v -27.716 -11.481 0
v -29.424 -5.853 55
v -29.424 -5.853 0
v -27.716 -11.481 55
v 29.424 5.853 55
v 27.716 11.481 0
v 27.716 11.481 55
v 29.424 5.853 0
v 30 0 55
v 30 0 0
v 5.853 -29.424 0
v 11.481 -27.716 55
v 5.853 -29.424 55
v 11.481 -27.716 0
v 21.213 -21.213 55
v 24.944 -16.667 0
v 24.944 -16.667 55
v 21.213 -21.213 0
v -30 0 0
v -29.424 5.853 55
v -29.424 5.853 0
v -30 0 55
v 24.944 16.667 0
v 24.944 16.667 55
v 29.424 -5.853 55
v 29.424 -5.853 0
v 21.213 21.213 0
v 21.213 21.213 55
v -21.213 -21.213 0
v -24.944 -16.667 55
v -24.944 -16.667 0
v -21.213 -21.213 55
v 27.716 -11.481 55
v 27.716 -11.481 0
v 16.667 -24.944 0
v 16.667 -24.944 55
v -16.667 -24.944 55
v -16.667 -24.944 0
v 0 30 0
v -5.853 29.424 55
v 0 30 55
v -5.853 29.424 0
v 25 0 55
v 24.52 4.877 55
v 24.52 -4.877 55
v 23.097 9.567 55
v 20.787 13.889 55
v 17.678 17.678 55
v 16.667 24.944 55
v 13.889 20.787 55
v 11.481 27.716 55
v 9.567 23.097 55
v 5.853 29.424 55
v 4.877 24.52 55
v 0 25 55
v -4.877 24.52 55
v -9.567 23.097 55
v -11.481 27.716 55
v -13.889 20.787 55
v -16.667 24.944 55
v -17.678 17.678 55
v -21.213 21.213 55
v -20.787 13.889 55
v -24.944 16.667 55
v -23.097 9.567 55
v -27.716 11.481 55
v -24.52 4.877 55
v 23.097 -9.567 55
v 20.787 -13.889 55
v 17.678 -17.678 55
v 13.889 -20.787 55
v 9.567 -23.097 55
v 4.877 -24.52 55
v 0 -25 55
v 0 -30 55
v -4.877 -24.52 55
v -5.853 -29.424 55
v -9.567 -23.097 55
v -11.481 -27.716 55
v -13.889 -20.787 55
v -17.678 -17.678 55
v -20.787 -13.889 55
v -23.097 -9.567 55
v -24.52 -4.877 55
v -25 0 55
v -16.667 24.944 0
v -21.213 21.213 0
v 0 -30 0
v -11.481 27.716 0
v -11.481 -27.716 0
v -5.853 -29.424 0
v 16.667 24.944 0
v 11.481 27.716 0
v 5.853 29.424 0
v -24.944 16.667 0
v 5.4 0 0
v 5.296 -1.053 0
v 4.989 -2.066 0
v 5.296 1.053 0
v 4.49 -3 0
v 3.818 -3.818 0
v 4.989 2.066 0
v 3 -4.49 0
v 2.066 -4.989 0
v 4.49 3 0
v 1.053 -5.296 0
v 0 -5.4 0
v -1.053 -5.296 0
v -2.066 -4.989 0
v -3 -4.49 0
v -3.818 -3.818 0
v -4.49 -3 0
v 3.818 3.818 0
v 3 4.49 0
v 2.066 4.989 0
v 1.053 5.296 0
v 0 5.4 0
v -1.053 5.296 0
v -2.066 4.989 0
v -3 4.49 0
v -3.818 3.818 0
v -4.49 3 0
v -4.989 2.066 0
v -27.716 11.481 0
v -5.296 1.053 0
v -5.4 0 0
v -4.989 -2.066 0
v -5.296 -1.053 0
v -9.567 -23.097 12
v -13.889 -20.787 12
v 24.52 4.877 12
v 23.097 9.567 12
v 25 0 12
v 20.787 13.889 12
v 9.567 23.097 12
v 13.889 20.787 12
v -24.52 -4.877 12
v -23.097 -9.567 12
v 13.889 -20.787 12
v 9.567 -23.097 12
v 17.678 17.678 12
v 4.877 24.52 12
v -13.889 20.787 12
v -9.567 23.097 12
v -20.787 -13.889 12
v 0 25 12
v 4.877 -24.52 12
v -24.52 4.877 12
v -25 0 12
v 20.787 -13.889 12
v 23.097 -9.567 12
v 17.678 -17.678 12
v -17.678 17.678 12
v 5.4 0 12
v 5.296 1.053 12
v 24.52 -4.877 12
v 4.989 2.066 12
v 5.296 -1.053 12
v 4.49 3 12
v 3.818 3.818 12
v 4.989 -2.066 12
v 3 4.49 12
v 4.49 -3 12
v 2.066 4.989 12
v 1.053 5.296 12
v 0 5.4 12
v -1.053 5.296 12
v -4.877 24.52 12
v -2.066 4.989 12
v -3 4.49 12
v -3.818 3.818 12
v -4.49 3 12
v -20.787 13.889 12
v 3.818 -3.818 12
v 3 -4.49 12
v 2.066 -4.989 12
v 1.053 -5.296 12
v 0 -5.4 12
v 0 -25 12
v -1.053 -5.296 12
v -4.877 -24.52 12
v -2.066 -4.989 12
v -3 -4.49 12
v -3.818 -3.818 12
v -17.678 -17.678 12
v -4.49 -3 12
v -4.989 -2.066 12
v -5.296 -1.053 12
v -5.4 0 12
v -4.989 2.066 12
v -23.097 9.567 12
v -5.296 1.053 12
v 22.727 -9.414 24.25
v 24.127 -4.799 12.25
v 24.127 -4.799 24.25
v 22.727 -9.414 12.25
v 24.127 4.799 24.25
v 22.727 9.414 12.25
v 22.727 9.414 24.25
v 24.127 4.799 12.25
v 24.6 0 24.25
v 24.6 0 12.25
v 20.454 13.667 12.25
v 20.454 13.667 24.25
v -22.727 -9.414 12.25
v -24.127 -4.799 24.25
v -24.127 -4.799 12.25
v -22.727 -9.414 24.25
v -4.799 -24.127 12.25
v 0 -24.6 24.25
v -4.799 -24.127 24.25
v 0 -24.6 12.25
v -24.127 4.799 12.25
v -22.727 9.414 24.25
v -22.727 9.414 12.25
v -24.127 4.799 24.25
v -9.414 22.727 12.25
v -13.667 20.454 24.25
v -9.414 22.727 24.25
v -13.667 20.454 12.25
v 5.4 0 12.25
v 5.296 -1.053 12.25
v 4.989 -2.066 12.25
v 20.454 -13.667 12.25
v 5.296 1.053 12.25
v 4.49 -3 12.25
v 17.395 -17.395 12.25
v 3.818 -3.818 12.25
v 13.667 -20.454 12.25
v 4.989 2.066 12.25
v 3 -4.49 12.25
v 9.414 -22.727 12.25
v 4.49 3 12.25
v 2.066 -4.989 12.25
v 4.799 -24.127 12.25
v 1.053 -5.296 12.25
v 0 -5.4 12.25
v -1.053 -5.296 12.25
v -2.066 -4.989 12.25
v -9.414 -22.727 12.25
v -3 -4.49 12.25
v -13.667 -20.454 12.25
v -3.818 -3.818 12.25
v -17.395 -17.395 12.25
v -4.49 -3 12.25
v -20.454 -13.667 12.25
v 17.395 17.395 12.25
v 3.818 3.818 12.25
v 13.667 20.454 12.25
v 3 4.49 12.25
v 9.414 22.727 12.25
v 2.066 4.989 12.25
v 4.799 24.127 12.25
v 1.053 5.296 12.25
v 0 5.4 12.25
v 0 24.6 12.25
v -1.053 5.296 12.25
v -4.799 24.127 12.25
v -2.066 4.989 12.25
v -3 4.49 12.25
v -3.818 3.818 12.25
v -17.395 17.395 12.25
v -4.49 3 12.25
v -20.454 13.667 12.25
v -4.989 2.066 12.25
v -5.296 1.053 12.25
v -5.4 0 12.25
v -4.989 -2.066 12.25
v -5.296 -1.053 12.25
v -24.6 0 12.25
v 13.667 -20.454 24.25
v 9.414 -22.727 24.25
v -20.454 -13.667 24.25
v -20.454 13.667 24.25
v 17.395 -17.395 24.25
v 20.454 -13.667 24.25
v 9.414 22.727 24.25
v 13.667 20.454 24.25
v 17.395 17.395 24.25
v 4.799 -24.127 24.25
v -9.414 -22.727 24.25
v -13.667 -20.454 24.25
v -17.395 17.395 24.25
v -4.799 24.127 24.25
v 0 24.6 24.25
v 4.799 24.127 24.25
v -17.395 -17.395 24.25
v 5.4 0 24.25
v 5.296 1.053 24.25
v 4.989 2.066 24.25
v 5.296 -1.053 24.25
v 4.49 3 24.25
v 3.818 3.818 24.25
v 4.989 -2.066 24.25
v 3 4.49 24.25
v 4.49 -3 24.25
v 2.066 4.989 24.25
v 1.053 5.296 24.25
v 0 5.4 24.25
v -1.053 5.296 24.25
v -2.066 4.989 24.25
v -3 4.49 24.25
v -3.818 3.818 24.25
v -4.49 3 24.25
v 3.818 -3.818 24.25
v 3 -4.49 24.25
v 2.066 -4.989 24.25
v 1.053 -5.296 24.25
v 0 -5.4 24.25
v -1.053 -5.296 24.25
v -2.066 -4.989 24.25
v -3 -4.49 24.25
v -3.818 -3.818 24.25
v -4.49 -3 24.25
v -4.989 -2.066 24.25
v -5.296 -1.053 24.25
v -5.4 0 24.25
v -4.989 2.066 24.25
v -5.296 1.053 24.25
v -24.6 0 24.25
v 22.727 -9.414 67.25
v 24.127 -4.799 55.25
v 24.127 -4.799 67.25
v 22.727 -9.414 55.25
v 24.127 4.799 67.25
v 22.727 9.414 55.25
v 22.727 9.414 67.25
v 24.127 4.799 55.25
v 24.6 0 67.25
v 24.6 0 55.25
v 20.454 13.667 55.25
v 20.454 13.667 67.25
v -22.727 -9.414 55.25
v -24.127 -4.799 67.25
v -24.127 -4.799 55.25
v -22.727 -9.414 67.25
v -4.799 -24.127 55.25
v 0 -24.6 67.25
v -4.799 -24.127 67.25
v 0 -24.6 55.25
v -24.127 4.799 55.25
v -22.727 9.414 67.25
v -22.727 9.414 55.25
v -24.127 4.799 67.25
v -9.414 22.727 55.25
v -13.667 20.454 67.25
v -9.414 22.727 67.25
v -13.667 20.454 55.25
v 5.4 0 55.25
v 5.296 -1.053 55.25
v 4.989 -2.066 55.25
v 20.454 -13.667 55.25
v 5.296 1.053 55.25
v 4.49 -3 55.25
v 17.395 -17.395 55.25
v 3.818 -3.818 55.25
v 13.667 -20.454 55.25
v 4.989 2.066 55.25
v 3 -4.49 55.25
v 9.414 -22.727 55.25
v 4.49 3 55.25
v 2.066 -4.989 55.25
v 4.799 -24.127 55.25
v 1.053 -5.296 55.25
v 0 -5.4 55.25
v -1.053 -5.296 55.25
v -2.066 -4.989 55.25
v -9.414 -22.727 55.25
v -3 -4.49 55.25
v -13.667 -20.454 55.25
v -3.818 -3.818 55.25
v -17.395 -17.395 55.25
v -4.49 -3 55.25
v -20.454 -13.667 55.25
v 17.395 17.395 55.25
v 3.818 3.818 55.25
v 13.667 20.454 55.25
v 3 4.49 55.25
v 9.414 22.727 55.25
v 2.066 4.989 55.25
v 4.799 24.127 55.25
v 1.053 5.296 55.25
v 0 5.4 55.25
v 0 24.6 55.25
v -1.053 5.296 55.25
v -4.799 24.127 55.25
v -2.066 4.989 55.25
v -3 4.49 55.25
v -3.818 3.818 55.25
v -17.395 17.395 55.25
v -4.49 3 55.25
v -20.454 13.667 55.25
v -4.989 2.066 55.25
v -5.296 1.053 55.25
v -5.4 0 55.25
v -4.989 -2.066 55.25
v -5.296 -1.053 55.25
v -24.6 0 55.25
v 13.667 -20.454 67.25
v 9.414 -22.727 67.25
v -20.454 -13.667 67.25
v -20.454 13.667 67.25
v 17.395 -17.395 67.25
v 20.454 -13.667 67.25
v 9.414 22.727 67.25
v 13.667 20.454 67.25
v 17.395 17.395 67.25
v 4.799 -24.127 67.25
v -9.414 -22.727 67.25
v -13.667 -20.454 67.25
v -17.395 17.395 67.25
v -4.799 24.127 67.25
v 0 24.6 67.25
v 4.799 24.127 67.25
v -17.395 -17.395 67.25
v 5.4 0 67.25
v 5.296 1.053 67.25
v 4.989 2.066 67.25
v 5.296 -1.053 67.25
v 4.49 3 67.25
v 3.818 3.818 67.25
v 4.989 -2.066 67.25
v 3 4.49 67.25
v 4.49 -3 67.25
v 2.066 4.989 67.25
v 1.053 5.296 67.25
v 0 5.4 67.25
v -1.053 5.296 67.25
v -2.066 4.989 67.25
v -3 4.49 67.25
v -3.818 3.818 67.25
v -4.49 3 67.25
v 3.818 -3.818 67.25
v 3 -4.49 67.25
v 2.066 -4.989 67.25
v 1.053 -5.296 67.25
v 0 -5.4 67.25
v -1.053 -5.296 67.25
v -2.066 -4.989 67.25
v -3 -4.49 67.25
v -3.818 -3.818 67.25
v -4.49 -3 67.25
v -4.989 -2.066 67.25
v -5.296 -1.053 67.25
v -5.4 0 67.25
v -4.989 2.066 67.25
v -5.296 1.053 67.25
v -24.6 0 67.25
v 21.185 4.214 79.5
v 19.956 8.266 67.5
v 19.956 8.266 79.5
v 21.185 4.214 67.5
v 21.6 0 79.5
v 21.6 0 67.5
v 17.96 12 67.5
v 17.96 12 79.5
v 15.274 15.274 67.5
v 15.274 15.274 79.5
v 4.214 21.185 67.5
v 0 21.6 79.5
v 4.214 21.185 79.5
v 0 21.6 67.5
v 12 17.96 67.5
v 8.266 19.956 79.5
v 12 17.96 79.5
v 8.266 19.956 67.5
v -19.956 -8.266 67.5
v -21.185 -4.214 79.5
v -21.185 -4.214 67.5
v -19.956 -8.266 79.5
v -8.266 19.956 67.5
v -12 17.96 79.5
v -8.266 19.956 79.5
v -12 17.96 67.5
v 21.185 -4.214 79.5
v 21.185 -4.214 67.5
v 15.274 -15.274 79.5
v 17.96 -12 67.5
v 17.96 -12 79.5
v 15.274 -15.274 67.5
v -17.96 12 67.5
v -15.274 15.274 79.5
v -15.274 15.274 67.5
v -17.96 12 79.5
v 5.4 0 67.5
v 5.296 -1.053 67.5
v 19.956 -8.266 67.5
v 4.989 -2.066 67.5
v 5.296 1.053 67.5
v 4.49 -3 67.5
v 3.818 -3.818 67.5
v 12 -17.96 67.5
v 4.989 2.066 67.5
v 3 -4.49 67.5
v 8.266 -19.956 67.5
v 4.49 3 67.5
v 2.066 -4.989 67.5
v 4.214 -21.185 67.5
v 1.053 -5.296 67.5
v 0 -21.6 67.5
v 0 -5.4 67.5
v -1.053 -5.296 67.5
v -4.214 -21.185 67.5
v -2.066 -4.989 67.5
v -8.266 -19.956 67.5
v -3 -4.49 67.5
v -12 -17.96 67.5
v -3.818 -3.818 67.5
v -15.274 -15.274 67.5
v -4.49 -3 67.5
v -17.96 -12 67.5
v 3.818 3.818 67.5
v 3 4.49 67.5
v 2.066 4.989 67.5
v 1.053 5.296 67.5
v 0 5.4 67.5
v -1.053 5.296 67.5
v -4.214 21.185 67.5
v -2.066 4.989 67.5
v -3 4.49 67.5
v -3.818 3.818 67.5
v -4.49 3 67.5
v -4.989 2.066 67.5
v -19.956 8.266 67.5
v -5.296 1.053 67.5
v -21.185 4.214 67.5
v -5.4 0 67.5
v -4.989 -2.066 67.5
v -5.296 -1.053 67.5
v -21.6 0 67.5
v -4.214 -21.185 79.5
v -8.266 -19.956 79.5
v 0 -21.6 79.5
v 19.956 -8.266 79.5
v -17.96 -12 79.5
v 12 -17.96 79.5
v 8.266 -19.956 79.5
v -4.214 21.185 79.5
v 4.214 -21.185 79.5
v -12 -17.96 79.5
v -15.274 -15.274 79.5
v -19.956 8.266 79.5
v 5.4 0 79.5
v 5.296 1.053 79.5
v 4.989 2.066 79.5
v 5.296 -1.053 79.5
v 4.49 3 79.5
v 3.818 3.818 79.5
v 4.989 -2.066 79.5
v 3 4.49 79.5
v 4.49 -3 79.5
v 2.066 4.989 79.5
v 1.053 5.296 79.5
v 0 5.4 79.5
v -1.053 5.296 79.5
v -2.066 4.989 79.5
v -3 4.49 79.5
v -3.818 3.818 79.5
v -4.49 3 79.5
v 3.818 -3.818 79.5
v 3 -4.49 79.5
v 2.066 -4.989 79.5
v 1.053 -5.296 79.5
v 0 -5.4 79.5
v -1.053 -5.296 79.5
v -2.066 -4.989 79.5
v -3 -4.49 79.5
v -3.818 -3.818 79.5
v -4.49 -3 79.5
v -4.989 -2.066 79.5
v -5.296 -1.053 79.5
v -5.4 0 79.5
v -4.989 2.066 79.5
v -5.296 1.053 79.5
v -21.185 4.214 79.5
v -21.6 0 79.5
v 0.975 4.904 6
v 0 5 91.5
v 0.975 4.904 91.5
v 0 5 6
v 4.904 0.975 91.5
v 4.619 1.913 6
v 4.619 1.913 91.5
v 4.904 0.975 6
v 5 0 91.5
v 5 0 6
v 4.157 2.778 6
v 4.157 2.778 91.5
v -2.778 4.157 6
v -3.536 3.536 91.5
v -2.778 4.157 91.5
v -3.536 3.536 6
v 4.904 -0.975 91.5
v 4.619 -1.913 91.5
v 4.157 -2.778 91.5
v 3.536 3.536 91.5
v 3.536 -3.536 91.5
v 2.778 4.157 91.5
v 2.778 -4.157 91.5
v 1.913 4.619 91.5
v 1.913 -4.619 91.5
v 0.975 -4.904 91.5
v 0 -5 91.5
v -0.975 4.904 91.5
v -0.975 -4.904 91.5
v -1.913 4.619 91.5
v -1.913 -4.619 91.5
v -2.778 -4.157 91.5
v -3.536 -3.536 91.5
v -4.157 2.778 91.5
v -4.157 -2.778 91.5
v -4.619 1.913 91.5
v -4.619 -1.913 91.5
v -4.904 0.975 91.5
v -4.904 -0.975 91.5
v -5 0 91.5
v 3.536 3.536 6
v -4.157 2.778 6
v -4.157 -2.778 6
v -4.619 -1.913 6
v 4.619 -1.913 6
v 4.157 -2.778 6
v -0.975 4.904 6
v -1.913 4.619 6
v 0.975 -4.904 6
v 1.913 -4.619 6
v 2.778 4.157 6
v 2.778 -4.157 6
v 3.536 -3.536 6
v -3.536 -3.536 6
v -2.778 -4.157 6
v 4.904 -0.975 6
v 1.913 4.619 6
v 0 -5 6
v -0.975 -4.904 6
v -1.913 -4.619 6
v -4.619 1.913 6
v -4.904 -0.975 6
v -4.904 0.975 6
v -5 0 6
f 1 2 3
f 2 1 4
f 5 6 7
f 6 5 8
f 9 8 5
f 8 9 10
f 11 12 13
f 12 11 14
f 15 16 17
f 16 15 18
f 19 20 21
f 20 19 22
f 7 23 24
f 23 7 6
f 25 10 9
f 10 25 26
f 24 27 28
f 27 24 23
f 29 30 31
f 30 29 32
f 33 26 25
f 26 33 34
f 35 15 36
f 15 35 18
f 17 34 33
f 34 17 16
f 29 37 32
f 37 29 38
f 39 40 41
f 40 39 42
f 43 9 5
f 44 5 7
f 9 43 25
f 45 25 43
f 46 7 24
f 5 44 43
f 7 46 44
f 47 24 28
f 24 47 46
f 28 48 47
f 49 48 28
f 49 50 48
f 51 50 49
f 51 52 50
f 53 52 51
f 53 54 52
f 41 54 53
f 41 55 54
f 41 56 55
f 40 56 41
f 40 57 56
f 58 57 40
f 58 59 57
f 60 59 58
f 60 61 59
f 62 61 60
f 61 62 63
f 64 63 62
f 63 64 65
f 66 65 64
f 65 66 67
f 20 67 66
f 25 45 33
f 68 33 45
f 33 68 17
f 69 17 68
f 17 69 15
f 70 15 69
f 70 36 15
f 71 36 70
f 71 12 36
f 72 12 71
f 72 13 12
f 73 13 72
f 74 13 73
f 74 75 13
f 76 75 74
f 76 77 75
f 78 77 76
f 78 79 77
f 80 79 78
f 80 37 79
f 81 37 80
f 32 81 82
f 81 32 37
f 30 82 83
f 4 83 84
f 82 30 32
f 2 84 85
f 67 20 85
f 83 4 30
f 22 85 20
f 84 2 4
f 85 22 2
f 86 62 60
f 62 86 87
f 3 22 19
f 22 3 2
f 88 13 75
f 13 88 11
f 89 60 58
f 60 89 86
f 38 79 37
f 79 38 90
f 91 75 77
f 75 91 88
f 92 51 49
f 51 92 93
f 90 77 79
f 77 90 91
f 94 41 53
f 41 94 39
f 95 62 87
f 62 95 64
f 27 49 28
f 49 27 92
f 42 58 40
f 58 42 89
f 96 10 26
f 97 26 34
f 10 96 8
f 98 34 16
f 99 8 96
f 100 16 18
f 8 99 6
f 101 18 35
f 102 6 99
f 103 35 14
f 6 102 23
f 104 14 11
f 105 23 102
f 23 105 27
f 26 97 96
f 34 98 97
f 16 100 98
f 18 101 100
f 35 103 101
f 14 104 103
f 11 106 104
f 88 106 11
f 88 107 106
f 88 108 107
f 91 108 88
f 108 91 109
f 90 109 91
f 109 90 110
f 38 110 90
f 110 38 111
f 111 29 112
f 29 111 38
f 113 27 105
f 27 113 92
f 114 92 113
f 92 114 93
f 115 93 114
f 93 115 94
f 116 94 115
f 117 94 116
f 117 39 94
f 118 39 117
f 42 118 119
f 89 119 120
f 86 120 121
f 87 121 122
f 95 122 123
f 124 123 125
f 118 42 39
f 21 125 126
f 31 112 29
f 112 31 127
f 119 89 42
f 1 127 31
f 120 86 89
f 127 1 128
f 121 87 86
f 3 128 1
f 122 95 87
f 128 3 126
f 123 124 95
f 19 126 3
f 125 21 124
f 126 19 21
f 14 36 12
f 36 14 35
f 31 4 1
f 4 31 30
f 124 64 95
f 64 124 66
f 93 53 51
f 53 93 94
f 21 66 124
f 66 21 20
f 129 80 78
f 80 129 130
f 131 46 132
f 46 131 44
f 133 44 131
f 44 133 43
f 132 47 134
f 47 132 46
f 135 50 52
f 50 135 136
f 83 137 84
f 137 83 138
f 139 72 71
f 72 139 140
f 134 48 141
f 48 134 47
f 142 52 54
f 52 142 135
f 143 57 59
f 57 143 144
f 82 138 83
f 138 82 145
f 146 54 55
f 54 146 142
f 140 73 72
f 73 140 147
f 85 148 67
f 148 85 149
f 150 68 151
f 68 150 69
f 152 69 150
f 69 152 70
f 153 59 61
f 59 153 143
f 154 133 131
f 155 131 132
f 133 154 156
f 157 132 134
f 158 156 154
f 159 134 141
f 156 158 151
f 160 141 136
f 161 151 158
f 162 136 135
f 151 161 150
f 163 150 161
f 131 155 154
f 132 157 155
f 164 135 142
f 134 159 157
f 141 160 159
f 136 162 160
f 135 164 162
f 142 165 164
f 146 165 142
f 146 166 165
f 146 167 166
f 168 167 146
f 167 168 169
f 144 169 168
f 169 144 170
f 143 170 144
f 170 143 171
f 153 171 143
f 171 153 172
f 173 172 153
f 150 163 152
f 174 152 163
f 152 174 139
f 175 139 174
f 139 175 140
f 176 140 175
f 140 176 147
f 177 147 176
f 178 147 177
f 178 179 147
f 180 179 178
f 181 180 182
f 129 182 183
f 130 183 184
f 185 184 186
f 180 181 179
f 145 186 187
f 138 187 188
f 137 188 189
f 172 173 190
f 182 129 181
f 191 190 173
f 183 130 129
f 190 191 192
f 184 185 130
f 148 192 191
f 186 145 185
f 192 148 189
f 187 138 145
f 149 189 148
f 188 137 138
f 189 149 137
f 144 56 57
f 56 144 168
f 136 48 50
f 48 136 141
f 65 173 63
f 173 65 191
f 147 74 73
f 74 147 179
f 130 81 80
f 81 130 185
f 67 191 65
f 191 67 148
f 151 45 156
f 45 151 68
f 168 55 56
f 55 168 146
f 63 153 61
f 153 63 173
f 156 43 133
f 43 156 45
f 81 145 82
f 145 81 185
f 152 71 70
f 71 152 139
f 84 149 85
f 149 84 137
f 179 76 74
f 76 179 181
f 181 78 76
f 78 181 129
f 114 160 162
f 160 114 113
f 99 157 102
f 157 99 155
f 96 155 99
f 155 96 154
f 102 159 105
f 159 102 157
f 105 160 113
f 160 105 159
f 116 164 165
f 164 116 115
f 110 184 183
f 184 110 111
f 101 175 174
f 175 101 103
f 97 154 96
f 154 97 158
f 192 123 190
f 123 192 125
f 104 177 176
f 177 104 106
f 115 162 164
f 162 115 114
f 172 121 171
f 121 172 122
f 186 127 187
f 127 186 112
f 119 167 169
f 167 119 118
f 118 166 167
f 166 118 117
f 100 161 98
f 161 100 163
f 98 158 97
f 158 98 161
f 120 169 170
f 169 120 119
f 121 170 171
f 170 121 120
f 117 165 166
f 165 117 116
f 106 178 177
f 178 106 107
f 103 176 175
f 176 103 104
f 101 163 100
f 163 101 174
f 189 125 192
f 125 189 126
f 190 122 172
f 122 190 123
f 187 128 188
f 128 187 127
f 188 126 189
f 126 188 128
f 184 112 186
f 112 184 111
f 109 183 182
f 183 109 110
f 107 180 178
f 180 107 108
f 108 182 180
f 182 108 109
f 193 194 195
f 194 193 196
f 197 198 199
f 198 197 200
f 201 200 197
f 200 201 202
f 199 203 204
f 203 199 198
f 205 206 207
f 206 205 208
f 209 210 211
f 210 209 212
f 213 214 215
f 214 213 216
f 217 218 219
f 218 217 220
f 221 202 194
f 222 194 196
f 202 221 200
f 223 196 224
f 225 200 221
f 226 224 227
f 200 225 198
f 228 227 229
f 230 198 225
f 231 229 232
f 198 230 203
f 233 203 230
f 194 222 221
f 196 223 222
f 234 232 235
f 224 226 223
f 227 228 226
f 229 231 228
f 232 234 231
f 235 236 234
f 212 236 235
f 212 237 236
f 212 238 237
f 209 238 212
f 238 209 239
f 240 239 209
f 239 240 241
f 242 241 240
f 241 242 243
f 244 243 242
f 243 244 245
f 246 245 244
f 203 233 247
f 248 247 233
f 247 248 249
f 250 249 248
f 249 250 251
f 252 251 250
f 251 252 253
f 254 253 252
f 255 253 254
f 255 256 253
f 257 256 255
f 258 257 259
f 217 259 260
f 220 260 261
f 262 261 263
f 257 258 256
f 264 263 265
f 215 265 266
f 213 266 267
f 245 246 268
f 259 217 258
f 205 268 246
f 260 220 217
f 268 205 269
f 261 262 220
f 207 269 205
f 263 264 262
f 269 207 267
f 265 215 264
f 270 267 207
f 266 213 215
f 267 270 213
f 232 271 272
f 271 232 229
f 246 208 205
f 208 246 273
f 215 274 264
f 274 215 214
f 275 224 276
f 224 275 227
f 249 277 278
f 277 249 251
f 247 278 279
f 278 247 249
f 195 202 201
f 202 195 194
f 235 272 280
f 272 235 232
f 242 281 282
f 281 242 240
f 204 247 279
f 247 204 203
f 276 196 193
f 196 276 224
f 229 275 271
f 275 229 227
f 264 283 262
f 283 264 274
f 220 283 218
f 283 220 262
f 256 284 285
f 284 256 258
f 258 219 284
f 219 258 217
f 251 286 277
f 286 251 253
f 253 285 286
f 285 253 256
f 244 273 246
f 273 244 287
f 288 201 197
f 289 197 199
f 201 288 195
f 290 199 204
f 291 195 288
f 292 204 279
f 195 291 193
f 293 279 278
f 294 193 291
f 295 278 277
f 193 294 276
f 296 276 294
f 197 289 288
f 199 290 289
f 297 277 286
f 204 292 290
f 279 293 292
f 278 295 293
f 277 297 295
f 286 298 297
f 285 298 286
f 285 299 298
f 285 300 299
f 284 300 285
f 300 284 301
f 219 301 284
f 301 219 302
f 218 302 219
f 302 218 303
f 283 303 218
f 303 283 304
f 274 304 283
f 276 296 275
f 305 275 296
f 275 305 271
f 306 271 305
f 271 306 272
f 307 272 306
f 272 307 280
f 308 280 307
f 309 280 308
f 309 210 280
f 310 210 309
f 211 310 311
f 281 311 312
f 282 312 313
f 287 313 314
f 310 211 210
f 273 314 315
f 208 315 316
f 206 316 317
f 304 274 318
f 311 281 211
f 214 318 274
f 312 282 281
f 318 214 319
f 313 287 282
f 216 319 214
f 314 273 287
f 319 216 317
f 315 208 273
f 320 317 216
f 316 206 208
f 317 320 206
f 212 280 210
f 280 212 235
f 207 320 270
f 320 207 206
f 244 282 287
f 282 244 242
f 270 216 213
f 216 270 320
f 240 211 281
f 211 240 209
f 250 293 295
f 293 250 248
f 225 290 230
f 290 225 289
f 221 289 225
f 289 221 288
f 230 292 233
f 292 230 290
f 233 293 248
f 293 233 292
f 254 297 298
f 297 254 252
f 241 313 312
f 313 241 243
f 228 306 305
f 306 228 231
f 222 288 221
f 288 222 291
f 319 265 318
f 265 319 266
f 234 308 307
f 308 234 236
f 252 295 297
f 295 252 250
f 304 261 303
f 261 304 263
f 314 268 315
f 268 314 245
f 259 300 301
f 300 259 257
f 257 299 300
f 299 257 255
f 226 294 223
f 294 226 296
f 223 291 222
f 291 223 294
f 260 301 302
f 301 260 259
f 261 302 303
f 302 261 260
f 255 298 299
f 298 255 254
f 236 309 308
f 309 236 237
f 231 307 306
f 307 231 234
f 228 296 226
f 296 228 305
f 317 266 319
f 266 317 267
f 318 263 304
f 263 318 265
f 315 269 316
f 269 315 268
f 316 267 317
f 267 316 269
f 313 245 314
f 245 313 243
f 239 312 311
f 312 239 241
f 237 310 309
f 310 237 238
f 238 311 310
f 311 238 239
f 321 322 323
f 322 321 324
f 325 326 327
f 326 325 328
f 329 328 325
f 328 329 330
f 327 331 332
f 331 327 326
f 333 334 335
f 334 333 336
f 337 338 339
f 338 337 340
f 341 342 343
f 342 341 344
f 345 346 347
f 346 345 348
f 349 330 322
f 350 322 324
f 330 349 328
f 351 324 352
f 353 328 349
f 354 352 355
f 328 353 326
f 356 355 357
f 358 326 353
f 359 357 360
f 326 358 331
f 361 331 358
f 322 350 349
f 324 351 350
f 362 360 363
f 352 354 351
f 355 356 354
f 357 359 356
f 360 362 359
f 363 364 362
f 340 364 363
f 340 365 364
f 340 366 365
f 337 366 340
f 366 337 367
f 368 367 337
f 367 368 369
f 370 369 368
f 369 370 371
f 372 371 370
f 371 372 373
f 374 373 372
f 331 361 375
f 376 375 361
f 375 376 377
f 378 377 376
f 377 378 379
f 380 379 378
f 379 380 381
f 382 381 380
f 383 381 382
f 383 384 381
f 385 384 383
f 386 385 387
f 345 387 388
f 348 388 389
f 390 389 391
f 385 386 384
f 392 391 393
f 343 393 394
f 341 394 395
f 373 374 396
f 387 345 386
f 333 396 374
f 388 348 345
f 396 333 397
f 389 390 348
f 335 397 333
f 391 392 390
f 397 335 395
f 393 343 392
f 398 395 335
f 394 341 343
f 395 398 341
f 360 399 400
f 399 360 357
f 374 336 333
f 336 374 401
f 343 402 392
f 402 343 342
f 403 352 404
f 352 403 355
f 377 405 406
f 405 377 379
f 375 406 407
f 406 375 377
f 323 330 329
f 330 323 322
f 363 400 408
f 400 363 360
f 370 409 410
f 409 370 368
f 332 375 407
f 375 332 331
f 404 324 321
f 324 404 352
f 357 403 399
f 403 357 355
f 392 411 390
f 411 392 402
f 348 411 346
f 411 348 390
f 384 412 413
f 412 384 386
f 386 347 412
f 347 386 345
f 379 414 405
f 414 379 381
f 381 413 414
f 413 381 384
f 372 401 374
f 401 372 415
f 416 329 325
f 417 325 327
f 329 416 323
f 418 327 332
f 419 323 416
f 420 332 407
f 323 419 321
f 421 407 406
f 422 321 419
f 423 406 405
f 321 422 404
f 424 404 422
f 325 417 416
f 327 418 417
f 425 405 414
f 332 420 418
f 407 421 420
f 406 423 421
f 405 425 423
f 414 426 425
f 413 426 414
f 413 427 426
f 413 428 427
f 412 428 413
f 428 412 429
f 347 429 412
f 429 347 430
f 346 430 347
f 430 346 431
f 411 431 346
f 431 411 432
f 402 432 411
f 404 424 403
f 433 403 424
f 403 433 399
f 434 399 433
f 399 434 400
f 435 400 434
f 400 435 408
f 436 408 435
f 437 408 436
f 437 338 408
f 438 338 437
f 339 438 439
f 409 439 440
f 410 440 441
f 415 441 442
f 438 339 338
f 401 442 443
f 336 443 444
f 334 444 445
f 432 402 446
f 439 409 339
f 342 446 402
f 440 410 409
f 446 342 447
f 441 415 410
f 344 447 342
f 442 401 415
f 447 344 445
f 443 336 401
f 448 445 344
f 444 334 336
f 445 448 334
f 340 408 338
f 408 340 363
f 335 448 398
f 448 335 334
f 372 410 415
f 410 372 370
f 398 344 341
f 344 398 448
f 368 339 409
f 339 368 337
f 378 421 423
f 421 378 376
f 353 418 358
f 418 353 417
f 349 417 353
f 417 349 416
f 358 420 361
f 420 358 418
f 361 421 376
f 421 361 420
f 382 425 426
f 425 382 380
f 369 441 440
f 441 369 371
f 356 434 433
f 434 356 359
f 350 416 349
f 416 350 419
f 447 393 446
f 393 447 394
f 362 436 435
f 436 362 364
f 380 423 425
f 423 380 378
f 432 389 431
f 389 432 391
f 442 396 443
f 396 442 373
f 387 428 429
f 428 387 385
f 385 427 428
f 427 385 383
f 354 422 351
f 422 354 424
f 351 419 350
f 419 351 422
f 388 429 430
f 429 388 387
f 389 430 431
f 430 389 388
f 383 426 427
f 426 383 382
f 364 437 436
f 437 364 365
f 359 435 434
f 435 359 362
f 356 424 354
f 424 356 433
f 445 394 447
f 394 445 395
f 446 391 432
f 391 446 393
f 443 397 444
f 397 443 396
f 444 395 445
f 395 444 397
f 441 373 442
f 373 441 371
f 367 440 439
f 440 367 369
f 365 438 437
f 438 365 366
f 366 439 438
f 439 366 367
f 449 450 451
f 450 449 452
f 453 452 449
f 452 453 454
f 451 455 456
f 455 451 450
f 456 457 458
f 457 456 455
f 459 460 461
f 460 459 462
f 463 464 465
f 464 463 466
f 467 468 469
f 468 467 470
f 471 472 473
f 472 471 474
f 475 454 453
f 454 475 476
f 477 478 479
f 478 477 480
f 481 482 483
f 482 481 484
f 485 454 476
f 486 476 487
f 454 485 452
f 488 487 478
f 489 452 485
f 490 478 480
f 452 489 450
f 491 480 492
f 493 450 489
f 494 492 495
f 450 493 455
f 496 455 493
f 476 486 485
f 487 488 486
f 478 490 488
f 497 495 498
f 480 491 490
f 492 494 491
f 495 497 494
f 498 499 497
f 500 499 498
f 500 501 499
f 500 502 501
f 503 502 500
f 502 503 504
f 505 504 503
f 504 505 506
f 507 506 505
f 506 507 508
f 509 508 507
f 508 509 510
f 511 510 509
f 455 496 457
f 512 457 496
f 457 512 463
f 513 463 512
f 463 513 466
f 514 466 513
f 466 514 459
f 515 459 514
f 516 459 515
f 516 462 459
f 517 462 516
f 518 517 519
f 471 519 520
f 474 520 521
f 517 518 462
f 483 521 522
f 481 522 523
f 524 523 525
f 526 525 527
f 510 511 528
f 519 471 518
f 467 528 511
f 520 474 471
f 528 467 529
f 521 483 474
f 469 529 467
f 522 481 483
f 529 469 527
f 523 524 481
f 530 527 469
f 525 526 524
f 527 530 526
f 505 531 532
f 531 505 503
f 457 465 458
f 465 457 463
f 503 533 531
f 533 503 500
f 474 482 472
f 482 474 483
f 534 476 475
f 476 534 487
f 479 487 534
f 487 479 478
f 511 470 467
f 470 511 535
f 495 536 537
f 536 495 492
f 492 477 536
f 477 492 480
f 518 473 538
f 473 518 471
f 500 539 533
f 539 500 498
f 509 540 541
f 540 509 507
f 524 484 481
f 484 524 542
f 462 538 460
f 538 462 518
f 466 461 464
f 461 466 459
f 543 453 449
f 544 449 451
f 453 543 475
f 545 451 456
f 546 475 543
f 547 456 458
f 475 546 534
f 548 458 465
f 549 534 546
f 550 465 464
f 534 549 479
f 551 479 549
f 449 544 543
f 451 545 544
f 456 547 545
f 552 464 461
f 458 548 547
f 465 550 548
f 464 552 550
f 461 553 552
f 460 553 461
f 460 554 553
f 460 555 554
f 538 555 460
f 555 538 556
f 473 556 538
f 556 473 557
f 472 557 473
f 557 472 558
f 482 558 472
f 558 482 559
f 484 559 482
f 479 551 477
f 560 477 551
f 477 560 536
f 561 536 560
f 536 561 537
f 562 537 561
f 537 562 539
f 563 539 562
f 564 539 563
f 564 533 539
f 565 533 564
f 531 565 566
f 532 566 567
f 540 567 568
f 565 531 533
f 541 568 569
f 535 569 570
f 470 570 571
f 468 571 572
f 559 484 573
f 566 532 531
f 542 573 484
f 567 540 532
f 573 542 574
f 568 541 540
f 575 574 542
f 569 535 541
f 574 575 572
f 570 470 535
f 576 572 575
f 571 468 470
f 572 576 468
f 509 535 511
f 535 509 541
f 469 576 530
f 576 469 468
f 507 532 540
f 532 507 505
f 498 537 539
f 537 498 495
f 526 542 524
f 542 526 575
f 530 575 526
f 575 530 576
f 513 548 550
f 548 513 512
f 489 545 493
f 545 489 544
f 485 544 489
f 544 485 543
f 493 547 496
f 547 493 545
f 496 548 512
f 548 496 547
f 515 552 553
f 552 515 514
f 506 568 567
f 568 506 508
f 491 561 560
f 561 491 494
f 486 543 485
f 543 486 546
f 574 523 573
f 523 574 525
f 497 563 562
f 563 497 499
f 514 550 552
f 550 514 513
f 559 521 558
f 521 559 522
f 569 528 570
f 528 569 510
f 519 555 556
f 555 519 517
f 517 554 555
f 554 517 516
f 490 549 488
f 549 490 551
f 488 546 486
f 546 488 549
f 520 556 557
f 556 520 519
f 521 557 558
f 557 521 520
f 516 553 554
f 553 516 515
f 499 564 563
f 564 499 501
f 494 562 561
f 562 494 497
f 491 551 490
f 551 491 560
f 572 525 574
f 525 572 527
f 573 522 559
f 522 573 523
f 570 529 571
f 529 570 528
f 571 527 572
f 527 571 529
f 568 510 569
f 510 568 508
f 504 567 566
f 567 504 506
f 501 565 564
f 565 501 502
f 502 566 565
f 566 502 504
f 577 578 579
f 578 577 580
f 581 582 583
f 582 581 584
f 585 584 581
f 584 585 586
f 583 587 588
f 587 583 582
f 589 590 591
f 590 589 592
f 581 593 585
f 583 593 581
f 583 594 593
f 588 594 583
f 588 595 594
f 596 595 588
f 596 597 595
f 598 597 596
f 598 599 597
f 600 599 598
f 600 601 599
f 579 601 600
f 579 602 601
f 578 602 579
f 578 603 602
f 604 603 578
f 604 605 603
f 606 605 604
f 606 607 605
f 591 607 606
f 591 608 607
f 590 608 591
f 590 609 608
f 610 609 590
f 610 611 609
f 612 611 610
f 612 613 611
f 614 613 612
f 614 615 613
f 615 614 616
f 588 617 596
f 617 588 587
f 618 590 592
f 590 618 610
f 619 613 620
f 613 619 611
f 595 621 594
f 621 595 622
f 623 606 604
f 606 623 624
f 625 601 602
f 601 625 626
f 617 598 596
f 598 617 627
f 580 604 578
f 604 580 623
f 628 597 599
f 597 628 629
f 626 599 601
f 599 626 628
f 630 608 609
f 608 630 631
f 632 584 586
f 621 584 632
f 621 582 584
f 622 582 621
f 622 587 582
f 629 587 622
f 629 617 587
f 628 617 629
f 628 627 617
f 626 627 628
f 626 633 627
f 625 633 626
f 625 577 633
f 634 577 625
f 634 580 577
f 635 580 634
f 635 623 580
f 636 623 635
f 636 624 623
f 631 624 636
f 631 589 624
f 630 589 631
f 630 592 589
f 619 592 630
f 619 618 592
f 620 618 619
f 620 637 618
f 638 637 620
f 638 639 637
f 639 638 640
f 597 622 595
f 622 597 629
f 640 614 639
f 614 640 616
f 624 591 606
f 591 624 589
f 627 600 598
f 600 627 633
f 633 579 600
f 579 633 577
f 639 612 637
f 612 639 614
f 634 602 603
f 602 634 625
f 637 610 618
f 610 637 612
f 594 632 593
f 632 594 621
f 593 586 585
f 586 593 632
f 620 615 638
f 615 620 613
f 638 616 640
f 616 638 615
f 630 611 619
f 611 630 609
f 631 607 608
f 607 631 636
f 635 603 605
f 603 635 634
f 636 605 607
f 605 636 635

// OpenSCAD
$fn = 32;

// ------------------------------------------------------------------------
// Bearing housing: housing d60, two bearings and a shaft
// Every part is its own module, assembly() places them once.
// ------------------------------------------------------------------------

// --- part 1 ---
module housing() {
  difference() {
    cylinder(h = 55, d = 60);
    translate([0, 0, 12]) cylinder(h = 44, d = 50);
    translate([0, 0, -1]) cylinder(h = 14, d = 10.8);
  }
}

// --- part 2 ---
module bearing_lower() {
  difference() {
      translate([0, 0, 0]) cylinder(h = 12, d = 49.2);
      translate([0, 0, -1]) cylinder(h = 14, d = 10.8);
    }
}

// --- part 3 ---
module bearing_upper() {
  difference() {
      translate([0, 0, 0]) cylinder(h = 12, d = 49.2);
      translate([0, 0, -1]) cylinder(h = 14, d = 10.8);
    }
}

// --- part 4 ---
module spacer() {
  difference() {
      translate([0, 0, 0]) cylinder(h = 12, d = 43.2);
      translate([0, 0, -1]) cylinder(h = 14, d = 10.8);
    }
}

// --- part 5 ---
module shaft() {
  translate([0, 0, -42.75]) cylinder(h = 85.5, d = 10);
}

// --- assembly ---
module assembly() {
  translate([0, 0, 0]) rotate([0, 0, 0]) housing();
  translate([0, 0, 12.25]) rotate([0, 0, 0]) bearing_lower();
  translate([0, 0, 55.25]) rotate([0, 0, 0]) bearing_upper();
  translate([0, 0, 67.5]) rotate([0, 0, 0]) spacer();
  translate([0, 0, 48.75]) rotate([0, 0, 0]) shaft();
}

assembly();
